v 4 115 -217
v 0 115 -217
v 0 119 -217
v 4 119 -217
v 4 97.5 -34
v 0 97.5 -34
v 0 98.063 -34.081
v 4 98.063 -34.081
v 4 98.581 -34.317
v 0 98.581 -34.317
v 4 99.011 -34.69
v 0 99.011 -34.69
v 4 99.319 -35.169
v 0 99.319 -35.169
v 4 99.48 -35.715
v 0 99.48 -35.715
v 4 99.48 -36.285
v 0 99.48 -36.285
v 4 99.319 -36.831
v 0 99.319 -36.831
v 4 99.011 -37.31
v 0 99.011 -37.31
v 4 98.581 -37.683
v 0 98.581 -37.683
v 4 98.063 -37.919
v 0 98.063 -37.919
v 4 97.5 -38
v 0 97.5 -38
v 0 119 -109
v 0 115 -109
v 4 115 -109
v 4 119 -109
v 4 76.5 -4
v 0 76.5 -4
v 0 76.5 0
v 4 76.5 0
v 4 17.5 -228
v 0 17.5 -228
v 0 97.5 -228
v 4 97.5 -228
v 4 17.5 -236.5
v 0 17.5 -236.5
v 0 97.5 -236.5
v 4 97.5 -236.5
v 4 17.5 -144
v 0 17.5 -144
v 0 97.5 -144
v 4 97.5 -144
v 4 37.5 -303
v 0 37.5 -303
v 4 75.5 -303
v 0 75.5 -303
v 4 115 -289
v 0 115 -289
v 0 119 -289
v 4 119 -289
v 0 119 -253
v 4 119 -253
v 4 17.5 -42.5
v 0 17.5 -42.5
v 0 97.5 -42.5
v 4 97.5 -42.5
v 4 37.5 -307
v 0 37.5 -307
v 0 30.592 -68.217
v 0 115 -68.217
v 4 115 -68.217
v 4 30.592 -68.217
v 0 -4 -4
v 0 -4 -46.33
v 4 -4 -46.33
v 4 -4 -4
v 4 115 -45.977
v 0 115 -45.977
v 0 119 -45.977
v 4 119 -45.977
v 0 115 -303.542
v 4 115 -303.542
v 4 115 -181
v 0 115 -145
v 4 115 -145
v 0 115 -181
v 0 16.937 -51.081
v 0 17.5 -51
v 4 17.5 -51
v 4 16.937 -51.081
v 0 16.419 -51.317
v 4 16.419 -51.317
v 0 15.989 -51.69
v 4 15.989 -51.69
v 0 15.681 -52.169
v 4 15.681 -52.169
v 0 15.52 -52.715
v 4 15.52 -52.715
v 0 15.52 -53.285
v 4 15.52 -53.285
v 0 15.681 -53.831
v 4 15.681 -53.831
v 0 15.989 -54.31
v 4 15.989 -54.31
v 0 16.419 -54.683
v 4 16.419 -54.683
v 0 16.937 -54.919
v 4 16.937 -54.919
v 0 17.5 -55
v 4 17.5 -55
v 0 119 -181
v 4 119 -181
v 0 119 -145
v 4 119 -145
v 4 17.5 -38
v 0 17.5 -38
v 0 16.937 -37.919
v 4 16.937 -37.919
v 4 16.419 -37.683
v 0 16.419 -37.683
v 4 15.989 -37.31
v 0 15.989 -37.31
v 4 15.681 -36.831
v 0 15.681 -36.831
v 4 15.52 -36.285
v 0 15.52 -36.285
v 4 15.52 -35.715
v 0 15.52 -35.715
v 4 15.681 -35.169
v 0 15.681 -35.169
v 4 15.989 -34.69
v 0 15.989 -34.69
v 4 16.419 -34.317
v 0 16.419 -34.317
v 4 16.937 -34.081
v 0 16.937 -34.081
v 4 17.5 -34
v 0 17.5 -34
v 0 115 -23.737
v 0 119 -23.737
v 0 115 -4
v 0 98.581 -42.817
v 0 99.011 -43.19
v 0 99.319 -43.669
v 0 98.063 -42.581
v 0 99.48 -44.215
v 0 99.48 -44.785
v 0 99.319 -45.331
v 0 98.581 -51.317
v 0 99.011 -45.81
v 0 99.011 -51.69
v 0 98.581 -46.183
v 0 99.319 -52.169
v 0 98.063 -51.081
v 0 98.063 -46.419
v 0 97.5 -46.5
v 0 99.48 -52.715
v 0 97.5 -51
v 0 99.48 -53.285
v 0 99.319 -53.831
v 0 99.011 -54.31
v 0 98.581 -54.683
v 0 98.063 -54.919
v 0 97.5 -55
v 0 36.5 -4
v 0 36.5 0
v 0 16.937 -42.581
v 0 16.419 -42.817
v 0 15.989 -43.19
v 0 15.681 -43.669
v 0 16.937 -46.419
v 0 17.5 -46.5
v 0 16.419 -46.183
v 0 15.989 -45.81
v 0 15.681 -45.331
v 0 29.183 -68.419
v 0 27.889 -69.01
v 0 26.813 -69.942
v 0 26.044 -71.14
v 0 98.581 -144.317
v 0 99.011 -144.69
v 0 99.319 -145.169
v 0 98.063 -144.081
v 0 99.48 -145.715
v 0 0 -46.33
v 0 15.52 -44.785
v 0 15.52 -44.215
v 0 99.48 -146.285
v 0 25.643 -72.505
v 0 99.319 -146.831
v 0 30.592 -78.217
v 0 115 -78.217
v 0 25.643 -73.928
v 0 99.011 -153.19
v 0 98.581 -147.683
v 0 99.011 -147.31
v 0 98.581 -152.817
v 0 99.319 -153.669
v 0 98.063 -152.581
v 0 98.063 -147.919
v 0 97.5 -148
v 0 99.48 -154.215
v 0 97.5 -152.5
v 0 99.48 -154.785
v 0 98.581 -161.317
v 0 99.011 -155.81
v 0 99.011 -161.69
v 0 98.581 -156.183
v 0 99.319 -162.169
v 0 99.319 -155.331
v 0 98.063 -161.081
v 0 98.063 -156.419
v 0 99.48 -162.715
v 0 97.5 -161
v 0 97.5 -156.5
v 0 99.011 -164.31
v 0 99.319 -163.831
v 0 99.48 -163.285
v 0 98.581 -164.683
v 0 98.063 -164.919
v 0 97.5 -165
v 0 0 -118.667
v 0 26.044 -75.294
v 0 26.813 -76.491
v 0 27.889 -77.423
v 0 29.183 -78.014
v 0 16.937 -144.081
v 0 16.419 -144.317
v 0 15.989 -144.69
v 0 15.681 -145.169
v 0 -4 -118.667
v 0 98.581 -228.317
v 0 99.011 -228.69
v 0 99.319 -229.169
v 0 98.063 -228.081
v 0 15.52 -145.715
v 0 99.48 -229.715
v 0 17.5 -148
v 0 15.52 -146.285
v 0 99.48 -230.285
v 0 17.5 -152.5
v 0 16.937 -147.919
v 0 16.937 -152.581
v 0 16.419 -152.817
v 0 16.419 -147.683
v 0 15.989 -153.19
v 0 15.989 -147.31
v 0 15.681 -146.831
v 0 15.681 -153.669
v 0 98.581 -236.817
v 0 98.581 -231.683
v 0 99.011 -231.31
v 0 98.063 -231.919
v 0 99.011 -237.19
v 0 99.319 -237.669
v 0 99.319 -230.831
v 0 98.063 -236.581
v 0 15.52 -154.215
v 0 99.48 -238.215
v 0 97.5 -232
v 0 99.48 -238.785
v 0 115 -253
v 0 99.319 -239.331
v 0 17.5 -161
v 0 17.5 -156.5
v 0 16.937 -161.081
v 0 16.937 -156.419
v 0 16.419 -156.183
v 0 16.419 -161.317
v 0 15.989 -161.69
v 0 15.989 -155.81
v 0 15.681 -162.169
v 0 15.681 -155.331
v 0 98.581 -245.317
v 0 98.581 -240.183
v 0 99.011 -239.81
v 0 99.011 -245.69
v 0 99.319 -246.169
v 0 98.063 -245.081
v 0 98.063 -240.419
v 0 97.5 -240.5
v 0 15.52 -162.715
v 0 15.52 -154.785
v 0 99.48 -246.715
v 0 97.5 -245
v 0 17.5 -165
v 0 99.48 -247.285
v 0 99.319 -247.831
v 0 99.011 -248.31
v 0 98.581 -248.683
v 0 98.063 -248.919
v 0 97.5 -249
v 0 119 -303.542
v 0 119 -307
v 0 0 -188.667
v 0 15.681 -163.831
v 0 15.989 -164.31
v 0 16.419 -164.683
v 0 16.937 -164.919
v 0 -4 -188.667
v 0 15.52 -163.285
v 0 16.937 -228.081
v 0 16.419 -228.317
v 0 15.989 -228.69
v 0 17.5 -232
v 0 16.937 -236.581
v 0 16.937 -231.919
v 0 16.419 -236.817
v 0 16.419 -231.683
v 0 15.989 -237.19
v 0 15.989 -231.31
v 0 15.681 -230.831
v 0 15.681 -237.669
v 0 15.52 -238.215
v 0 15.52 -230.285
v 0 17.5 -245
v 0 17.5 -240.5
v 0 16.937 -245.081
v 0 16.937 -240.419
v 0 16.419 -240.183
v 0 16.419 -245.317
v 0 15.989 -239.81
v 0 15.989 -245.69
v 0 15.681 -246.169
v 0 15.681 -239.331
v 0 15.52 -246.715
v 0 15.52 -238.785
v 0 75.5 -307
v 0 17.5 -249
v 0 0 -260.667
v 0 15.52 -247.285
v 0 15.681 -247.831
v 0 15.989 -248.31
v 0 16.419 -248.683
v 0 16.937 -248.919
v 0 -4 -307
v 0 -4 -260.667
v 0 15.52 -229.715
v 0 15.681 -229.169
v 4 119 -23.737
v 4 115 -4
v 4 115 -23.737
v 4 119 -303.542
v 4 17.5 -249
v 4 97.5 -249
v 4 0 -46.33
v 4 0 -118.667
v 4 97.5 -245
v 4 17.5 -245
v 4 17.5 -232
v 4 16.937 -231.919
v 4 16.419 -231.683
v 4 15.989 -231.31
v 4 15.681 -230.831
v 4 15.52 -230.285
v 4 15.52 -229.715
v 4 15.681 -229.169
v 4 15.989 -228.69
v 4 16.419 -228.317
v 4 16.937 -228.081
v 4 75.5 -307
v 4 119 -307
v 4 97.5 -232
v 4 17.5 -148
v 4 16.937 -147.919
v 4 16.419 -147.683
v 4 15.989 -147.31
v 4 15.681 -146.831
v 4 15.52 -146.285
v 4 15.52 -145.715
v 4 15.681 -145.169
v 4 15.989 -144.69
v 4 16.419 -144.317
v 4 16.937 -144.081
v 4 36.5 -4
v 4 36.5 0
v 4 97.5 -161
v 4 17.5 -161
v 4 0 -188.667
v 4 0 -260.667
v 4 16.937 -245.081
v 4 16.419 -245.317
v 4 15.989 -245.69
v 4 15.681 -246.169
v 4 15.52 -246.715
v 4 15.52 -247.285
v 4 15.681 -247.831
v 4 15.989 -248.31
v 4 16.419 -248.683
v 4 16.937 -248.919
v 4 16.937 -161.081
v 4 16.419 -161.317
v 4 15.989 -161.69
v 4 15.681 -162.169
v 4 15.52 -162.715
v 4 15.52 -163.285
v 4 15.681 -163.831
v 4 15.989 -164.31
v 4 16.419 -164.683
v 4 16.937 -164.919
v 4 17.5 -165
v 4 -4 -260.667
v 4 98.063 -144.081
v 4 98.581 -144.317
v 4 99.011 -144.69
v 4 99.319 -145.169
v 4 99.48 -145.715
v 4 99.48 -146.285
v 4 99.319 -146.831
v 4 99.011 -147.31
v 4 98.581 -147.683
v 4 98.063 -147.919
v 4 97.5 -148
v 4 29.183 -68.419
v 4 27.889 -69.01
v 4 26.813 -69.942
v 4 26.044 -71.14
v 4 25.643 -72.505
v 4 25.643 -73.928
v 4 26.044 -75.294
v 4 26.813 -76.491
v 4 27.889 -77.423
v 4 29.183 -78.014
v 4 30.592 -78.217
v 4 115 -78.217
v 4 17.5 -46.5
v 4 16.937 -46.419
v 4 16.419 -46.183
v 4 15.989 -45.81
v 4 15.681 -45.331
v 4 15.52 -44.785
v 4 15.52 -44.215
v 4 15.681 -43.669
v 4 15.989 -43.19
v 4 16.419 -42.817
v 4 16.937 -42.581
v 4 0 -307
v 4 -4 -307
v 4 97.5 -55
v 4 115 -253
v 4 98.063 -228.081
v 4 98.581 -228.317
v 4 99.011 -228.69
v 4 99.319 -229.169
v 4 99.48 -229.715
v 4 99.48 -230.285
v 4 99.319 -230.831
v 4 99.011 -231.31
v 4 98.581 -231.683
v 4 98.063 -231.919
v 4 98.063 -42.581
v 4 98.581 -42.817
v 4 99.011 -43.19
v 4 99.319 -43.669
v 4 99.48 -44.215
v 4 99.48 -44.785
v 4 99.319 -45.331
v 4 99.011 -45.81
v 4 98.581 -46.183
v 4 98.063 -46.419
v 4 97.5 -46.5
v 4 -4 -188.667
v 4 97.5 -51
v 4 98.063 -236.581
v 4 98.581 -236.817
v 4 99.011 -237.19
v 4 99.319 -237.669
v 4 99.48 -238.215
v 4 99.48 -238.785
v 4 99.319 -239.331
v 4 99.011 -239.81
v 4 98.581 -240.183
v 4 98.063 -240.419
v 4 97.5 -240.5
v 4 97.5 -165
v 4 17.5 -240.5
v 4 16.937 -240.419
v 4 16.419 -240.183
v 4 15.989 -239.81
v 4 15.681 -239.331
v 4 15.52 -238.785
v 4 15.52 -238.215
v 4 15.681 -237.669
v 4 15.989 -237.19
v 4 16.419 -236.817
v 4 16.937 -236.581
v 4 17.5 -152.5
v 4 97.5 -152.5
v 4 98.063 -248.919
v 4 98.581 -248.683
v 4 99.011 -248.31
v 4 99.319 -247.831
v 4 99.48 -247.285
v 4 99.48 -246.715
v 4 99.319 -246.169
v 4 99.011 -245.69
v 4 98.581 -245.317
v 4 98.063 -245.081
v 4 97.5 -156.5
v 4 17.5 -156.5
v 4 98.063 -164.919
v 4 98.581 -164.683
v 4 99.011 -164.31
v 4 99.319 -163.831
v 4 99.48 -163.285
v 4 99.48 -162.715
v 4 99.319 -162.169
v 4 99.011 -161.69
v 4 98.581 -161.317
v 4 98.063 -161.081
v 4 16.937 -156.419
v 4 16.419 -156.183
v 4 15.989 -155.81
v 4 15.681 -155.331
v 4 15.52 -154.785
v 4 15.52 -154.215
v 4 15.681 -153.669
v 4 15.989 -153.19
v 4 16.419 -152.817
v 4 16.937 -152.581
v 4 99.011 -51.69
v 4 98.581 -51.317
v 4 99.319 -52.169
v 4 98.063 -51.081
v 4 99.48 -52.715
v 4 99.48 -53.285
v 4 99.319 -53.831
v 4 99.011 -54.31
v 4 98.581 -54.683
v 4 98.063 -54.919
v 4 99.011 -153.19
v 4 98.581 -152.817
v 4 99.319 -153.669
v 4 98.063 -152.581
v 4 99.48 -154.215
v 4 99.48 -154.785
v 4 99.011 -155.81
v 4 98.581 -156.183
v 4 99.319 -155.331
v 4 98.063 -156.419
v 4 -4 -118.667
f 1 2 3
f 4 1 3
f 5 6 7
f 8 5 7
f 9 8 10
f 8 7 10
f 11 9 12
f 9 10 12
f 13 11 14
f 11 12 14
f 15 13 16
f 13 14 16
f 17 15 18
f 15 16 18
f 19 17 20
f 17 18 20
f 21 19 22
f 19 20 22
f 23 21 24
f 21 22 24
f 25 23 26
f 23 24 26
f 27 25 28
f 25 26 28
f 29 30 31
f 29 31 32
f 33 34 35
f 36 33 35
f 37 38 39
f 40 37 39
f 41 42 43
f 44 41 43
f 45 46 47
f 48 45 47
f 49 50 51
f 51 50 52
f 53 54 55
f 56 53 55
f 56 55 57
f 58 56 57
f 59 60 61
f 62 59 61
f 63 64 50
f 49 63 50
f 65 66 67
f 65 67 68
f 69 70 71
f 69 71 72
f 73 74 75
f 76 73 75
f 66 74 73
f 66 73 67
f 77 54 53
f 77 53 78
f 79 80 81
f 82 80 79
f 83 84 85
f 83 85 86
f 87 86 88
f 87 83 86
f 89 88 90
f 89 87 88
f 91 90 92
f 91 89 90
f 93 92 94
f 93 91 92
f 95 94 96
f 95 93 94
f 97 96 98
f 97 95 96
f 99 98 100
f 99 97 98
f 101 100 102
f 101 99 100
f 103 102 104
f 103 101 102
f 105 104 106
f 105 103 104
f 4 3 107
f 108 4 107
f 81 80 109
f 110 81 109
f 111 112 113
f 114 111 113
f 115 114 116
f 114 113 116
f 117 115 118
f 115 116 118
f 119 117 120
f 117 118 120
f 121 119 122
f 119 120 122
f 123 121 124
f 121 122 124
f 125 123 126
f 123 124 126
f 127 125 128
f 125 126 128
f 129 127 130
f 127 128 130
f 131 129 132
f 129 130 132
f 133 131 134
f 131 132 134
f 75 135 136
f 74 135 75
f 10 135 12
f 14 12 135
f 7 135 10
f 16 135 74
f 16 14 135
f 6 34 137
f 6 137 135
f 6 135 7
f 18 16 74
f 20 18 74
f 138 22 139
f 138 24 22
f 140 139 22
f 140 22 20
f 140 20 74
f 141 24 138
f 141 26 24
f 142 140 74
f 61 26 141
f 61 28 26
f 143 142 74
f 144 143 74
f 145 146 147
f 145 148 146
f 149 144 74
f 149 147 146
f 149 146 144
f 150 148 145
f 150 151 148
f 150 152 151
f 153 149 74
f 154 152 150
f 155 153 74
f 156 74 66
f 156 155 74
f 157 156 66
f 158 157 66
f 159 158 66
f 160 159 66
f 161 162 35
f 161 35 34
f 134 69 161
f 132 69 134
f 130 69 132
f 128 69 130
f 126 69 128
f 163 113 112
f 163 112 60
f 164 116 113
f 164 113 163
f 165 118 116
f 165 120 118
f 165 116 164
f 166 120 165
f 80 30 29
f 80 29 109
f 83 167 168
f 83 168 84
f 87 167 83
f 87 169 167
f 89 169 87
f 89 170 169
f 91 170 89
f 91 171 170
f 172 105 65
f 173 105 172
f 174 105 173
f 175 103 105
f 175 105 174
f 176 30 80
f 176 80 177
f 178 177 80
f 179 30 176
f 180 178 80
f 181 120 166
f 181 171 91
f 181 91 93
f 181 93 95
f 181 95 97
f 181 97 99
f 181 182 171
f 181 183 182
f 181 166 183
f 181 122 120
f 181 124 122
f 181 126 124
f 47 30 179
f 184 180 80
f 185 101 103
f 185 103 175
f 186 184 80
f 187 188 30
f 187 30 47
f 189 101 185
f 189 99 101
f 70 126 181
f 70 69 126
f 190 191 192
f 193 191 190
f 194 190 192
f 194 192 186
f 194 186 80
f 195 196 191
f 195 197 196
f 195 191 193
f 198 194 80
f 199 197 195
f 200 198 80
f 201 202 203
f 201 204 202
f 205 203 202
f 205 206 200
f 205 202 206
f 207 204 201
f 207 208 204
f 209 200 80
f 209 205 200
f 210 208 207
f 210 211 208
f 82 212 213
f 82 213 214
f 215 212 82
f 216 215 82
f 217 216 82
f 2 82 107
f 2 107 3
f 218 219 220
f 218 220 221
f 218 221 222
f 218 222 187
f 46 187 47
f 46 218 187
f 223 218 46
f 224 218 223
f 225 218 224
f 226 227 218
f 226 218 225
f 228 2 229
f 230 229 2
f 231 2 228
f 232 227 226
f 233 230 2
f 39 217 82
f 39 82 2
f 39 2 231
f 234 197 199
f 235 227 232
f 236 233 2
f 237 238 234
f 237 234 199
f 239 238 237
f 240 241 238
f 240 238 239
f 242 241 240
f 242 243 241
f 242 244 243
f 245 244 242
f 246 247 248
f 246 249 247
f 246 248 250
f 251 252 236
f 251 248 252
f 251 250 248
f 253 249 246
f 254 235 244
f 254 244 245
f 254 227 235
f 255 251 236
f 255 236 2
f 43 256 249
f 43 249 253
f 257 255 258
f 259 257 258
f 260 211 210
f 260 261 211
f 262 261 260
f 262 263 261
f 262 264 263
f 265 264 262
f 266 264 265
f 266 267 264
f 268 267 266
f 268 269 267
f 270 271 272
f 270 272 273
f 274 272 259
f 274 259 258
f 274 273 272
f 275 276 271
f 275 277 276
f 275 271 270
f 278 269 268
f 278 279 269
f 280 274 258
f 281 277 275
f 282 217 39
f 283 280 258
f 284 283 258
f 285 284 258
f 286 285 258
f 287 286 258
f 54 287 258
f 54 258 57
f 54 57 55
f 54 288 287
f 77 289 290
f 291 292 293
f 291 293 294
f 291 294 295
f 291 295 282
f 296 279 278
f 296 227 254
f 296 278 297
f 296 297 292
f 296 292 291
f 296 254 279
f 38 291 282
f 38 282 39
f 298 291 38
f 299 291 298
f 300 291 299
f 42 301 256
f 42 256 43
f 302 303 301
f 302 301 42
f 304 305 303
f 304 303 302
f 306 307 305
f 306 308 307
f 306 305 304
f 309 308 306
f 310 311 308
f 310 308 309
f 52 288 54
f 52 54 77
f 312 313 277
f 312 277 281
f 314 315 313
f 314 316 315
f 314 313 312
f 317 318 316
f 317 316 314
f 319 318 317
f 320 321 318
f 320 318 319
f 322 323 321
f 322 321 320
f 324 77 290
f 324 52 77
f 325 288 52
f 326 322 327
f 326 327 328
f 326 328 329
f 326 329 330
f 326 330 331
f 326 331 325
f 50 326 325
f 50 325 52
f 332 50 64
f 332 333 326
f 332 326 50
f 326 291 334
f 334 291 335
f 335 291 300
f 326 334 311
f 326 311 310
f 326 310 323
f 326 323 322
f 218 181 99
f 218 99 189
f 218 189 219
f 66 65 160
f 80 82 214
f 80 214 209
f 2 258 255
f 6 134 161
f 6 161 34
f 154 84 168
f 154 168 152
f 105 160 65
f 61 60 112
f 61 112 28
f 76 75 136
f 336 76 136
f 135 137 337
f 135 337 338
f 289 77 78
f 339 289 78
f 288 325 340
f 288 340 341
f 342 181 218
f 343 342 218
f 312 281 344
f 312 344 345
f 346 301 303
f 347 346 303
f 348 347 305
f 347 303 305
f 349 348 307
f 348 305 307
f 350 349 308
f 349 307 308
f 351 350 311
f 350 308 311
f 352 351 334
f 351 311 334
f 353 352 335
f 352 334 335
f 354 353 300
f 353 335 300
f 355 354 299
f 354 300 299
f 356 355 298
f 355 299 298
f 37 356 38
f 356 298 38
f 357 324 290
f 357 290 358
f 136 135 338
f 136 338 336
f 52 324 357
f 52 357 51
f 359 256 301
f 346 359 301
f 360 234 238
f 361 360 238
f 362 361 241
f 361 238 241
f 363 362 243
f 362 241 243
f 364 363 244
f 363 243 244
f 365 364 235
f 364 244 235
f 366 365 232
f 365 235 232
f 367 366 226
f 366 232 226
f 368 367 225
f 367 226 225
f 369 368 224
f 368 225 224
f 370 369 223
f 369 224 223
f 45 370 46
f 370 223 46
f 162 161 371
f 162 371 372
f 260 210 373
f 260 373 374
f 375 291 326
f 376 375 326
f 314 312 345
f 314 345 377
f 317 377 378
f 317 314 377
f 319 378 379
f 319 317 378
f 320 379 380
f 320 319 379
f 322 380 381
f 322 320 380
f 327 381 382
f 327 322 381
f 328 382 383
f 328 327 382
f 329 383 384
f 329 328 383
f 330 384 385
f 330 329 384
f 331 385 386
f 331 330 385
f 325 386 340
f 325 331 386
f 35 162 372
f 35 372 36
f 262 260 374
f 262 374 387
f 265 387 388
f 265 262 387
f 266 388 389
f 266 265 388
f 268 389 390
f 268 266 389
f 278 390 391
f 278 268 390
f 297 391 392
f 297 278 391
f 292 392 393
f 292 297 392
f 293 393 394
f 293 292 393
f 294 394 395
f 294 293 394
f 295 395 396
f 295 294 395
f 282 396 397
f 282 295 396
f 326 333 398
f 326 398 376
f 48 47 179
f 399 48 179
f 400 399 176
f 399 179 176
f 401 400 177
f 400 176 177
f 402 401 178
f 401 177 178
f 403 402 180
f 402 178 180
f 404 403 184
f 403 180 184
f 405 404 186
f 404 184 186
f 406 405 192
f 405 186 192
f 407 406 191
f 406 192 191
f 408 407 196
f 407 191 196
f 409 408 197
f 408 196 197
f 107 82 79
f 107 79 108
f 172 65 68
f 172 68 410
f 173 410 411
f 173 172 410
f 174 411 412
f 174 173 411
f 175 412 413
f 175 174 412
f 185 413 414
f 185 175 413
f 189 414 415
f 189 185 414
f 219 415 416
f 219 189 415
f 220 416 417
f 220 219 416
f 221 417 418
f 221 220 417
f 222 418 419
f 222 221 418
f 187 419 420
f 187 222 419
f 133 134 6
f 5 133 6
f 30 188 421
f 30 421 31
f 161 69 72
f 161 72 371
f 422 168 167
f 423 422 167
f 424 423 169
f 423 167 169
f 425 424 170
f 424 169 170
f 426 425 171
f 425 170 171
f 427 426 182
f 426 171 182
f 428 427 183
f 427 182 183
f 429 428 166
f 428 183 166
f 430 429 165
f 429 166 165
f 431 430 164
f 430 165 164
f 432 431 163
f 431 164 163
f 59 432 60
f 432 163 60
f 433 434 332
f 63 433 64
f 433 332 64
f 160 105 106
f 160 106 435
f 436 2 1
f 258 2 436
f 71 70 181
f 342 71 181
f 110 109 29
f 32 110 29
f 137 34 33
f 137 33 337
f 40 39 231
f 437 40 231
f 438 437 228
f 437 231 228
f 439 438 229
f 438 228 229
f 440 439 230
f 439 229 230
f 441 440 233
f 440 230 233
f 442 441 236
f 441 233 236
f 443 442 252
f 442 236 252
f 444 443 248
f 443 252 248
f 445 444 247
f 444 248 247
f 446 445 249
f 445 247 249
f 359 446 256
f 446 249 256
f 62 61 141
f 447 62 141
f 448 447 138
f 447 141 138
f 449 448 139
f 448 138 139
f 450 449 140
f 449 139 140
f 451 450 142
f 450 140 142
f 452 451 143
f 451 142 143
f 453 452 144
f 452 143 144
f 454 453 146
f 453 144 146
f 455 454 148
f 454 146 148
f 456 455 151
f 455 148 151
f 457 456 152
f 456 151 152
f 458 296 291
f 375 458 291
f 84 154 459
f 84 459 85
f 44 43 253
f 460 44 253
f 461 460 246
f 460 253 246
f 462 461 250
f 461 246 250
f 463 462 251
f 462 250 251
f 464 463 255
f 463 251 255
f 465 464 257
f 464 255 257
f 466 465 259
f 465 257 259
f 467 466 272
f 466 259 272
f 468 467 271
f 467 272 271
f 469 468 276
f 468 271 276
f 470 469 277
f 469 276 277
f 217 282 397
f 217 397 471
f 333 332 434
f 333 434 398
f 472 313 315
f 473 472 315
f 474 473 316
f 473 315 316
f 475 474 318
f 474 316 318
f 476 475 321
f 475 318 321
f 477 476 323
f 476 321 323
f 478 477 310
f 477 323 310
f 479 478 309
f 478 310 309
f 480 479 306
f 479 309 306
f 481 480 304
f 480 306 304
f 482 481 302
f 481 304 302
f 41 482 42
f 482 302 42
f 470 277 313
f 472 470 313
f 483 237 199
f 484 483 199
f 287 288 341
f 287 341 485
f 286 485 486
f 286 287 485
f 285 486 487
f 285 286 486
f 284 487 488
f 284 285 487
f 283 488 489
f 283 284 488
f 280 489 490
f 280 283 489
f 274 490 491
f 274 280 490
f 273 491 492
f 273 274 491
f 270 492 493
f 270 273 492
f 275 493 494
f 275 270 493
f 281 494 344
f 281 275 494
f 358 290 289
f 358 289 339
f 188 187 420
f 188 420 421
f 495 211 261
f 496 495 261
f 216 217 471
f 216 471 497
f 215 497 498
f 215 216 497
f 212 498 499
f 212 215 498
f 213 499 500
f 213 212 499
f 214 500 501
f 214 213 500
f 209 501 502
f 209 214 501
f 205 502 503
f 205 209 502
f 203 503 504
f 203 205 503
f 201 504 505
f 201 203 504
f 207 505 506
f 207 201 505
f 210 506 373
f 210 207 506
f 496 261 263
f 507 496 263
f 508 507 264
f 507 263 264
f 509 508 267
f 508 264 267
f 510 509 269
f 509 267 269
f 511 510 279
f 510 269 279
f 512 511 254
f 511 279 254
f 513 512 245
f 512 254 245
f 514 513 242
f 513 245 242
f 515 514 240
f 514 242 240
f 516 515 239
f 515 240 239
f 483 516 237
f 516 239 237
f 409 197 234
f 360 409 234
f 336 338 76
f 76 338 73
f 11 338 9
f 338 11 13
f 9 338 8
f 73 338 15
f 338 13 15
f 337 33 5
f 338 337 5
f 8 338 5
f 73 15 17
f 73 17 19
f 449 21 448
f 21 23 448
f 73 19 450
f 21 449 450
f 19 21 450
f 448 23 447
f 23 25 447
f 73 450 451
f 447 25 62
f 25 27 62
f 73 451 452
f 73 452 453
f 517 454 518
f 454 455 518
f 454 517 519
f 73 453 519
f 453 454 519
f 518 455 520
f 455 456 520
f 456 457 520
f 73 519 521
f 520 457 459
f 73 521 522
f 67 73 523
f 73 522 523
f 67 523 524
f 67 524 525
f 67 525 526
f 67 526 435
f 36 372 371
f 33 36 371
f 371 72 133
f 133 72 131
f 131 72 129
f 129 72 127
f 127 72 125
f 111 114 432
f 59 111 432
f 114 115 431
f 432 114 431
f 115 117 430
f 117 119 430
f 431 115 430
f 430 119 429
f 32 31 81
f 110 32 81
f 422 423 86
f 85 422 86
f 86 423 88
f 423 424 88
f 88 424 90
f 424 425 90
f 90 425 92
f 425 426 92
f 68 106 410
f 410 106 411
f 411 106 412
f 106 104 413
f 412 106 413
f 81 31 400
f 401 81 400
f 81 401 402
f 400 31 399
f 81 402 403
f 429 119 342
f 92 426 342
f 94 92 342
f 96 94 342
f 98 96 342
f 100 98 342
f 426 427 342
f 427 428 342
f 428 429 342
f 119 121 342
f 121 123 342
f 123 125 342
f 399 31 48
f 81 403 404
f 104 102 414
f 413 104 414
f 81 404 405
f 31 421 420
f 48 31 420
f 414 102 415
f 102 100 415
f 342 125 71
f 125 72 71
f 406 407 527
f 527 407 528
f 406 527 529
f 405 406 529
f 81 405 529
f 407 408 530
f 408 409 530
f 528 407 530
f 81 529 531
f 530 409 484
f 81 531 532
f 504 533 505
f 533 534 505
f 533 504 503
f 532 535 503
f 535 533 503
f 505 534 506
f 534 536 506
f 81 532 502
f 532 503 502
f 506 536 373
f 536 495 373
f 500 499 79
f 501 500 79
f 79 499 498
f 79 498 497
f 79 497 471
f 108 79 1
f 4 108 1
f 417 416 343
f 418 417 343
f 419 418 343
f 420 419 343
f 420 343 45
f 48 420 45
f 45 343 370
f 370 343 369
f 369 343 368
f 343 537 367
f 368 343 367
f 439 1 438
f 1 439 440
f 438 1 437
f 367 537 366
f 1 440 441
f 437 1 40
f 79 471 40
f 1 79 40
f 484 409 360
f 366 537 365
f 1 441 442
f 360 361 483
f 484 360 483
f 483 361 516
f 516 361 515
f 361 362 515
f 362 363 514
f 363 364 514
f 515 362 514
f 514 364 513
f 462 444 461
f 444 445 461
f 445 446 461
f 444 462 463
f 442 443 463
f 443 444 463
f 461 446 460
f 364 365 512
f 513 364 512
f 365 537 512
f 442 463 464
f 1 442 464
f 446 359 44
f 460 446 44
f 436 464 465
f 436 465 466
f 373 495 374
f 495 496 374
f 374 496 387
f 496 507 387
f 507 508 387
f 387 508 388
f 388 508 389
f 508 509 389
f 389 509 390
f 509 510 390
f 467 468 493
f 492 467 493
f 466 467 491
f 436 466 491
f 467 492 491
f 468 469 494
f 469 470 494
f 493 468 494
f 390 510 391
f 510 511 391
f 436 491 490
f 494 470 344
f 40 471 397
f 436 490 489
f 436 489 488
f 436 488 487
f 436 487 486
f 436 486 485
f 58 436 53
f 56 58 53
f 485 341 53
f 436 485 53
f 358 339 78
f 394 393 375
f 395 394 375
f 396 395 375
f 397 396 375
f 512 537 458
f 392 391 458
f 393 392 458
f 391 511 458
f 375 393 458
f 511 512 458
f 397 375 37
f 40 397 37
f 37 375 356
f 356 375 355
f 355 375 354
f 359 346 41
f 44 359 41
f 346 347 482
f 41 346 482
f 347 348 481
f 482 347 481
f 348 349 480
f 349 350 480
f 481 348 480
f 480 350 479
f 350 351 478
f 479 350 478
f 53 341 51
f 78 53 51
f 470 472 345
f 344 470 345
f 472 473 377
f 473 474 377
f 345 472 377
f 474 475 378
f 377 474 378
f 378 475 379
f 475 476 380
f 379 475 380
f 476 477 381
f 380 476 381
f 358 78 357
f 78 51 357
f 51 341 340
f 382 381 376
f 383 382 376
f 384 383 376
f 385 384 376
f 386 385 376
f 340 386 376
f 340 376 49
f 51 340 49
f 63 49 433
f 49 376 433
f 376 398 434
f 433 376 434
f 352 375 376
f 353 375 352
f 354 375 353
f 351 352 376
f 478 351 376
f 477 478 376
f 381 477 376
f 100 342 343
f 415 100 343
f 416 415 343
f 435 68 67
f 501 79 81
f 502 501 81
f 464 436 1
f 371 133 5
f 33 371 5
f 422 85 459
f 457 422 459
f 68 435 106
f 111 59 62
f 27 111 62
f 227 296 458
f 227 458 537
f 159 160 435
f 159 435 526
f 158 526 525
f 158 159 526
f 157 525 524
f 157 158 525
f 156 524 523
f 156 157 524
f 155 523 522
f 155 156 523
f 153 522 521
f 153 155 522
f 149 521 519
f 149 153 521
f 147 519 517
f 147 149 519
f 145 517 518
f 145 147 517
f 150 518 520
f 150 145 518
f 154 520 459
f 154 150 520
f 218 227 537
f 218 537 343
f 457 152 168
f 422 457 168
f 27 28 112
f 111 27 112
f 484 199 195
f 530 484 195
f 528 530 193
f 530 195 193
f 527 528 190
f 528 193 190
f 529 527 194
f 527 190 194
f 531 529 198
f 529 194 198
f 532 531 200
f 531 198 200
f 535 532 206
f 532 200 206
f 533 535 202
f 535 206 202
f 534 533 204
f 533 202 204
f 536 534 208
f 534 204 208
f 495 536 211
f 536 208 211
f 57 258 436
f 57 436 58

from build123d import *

# Parameters (mm, degrees)
SKETCH1_W           = 307
SKETCH1_H           = 115
BOSS_EXTRUDE1_DEPTH = 4
CUT_EXTRUDE1_DEPTH  = 4
SKETCH3_W           = 4
SKETCH3_H           = 40.5
SKETCH3_H_2         = 38.5
CUT_EXTRUDE2_DEPTH  = 4
SKETCH4_W           = 46.333333333
SKETCH4_H           = 4
SKETCH4_W_2         = 42.33
BOSS_EXTRUDE3_DEPTH = 4
SKETCH5_W           = 36
SKETCH5_H           = 4
BOSS_EXTRUDE4_DEPTH = 4
SKETCH7_W           = 22.24
SKETCH7_H           = 4
BOSS_EXTRUDE6_DEPTH = 4
SKETCH8_W           = 4
SKETCH8_H           = 38
CUT_EXTRUDE3_DEPTH  = 4
LPATTERN1_COUNT     = 3
LPATTERN1_PITCH     = 72
SKETCH9_W           = 70
SKETCH9_H           = 4
BOSS_EXTRUDE7_DEPTH = 4
CUT_EXTRUDE4_DEPTH  = 4
LPATTERN2_COUNT     = 2
LPATTERN2_PITCH     = 84
LPATTERN3_COUNT     = 2
LPATTERN3_PITCH     = 194
SKETCH11_W          = 4
SKETCH11_H          = 3.457617008
BOSS_EXTRUDE8_DEPTH = 4


with BuildPart() as part:
    # Sketch1 → Boss-Extrude1 (new body)
    with BuildSketch(Plane(origin=(0, 0, 0), x_dir=(0, 0, -1), z_dir=(1, 0, 0))):
        with Locations((153.5, 57.5)):
            Rectangle(SKETCH1_W, SKETCH1_H)
    extrude(amount=BOSS_EXTRUDE1_DEPTH)

    # Sketch2 → Cut-Extrude1 (cut)
    with BuildSketch(Plane.ZY):
        with BuildLine():
            Line((-78.216729868, 30.591924331), (-78.216729868, 118.288831206))
            Line((-78.216729868, 118.288831206), (-68.216729868, 118.288831206))
            Line((-68.216729868, 118.288831206), (-68.216729868, 30.591924331))
            ThreePointArc((-68.216729868, 30.591924331), (-73.216729868, 25.591924331), (-78.216729868, 30.591924331))
        make_face()
    extrude(amount=-CUT_EXTRUDE1_DEPTH, mode=Mode.SUBTRACT)

    # Sketch3 → Cut-Extrude2 (cut)
    with BuildSketch(Plane.ZY):
        with Locations((-2, 16.25)):
            Rectangle(SKETCH3_W, SKETCH3_H)
        with Locations((-2, 95.75)):
            Rectangle(SKETCH3_W, SKETCH3_H_2)
    extrude(amount=-CUT_EXTRUDE2_DEPTH, mode=Mode.SUBTRACT)

    # Sketch4 → Boss-Extrude3 (add)
    with BuildSketch(Plane.ZY):
        with Locations((-283.833333334, -2)):
            Rectangle(SKETCH4_W, SKETCH4_H)
        with Locations((-25.165, -2)):
            Rectangle(SKETCH4_W_2, SKETCH4_H)
    extrude(amount=-BOSS_EXTRUDE3_DEPTH)

    # Sketch5 → Boss-Extrude4 (add)
    with BuildSketch(Plane.ZY):
        with Locations((-271, 117)):
            Rectangle(SKETCH5_W, SKETCH5_H)
    boss_extrude4 = extrude(amount=-BOSS_EXTRUDE4_DEPTH)

    # Sketch7 → Boss-Extrude6 (add)
    with BuildSketch(Plane.ZY):
        with Locations((-34.856729868, 117)):
            Rectangle(SKETCH7_W, SKETCH7_H)
    extrude(amount=-BOSS_EXTRUDE6_DEPTH)

    # Sketch8 → Cut-Extrude3 (cut)
    with BuildSketch(Plane.ZY):
        with Locations((-305, 56.5)):
            Rectangle(SKETCH8_W, SKETCH8_H)
    extrude(amount=-CUT_EXTRUDE3_DEPTH, mode=Mode.SUBTRACT)

    # LPattern1: Boss-Extrude4 ×3
    with Locations(*[(0, 0, i * LPATTERN1_PITCH) for i in range(1, LPATTERN1_COUNT)]):
        add(boss_extrude4)

    # Sketch9 → Boss-Extrude7 (add)
    with BuildSketch(Plane.ZY):
        with Locations((-153.666666667, -2)):
            Rectangle(SKETCH9_W, SKETCH9_H)
    extrude(amount=-BOSS_EXTRUDE7_DEPTH)

    # Sketch10 → Cut-Extrude4 (cut)
    with BuildSketch(Plane.ZY):
        with BuildLine():
            Line((-245, 97.5), (-245, 17.5))
            ThreePointArc((-245, 17.5), (-247, 15.5), (-249, 17.5))
            Line((-249, 17.5), (-249, 97.5))
            ThreePointArc((-249, 97.5), (-247, 99.5), (-245, 97.5))
        make_face()
        with BuildLine():
            Line((-240.5, 97.5), (-240.5, 17.5))
            ThreePointArc((-240.5, 17.5), (-238.5, 15.5), (-236.5, 17.5))
            Line((-236.5, 17.5), (-236.5, 97.5))
            ThreePointArc((-236.5, 97.5), (-238.5, 99.5), (-240.5, 97.5))
        make_face()
        with BuildLine():
            Line((-232, 97.5), (-232, 17.5))
            ThreePointArc((-232, 17.5), (-230, 15.5), (-228, 17.5))
            Line((-228, 17.5), (-228, 97.5))
            ThreePointArc((-228, 97.5), (-230, 99.5), (-232, 97.5))
        make_face()
    cut_extrude4 = extrude(amount=-CUT_EXTRUDE4_DEPTH, mode=Mode.SUBTRACT)

    # LPattern2: Cut-Extrude4 ×2
    with Locations(*[(0, 0, i * LPATTERN2_PITCH) for i in range(1, LPATTERN2_COUNT)]):
        add(cut_extrude4, mode=Mode.SUBTRACT)

    # LPattern3: Cut-Extrude4 ×2
    with Locations(*[(0, 0, i * LPATTERN3_PITCH) for i in range(1, LPATTERN3_COUNT)]):
        add(cut_extrude4, mode=Mode.SUBTRACT)

    # Sketch11 → Boss-Extrude8 (add)
    with BuildSketch(Plane(origin=(0, 115, 0), x_dir=(1, 0, 0), z_dir=(0, 1, 0))):
        with Locations((2, 305.271191496)):
            Rectangle(SKETCH11_W, SKETCH11_H)
    extrude(amount=BOSS_EXTRUDE8_DEPTH)


solid = part.part
